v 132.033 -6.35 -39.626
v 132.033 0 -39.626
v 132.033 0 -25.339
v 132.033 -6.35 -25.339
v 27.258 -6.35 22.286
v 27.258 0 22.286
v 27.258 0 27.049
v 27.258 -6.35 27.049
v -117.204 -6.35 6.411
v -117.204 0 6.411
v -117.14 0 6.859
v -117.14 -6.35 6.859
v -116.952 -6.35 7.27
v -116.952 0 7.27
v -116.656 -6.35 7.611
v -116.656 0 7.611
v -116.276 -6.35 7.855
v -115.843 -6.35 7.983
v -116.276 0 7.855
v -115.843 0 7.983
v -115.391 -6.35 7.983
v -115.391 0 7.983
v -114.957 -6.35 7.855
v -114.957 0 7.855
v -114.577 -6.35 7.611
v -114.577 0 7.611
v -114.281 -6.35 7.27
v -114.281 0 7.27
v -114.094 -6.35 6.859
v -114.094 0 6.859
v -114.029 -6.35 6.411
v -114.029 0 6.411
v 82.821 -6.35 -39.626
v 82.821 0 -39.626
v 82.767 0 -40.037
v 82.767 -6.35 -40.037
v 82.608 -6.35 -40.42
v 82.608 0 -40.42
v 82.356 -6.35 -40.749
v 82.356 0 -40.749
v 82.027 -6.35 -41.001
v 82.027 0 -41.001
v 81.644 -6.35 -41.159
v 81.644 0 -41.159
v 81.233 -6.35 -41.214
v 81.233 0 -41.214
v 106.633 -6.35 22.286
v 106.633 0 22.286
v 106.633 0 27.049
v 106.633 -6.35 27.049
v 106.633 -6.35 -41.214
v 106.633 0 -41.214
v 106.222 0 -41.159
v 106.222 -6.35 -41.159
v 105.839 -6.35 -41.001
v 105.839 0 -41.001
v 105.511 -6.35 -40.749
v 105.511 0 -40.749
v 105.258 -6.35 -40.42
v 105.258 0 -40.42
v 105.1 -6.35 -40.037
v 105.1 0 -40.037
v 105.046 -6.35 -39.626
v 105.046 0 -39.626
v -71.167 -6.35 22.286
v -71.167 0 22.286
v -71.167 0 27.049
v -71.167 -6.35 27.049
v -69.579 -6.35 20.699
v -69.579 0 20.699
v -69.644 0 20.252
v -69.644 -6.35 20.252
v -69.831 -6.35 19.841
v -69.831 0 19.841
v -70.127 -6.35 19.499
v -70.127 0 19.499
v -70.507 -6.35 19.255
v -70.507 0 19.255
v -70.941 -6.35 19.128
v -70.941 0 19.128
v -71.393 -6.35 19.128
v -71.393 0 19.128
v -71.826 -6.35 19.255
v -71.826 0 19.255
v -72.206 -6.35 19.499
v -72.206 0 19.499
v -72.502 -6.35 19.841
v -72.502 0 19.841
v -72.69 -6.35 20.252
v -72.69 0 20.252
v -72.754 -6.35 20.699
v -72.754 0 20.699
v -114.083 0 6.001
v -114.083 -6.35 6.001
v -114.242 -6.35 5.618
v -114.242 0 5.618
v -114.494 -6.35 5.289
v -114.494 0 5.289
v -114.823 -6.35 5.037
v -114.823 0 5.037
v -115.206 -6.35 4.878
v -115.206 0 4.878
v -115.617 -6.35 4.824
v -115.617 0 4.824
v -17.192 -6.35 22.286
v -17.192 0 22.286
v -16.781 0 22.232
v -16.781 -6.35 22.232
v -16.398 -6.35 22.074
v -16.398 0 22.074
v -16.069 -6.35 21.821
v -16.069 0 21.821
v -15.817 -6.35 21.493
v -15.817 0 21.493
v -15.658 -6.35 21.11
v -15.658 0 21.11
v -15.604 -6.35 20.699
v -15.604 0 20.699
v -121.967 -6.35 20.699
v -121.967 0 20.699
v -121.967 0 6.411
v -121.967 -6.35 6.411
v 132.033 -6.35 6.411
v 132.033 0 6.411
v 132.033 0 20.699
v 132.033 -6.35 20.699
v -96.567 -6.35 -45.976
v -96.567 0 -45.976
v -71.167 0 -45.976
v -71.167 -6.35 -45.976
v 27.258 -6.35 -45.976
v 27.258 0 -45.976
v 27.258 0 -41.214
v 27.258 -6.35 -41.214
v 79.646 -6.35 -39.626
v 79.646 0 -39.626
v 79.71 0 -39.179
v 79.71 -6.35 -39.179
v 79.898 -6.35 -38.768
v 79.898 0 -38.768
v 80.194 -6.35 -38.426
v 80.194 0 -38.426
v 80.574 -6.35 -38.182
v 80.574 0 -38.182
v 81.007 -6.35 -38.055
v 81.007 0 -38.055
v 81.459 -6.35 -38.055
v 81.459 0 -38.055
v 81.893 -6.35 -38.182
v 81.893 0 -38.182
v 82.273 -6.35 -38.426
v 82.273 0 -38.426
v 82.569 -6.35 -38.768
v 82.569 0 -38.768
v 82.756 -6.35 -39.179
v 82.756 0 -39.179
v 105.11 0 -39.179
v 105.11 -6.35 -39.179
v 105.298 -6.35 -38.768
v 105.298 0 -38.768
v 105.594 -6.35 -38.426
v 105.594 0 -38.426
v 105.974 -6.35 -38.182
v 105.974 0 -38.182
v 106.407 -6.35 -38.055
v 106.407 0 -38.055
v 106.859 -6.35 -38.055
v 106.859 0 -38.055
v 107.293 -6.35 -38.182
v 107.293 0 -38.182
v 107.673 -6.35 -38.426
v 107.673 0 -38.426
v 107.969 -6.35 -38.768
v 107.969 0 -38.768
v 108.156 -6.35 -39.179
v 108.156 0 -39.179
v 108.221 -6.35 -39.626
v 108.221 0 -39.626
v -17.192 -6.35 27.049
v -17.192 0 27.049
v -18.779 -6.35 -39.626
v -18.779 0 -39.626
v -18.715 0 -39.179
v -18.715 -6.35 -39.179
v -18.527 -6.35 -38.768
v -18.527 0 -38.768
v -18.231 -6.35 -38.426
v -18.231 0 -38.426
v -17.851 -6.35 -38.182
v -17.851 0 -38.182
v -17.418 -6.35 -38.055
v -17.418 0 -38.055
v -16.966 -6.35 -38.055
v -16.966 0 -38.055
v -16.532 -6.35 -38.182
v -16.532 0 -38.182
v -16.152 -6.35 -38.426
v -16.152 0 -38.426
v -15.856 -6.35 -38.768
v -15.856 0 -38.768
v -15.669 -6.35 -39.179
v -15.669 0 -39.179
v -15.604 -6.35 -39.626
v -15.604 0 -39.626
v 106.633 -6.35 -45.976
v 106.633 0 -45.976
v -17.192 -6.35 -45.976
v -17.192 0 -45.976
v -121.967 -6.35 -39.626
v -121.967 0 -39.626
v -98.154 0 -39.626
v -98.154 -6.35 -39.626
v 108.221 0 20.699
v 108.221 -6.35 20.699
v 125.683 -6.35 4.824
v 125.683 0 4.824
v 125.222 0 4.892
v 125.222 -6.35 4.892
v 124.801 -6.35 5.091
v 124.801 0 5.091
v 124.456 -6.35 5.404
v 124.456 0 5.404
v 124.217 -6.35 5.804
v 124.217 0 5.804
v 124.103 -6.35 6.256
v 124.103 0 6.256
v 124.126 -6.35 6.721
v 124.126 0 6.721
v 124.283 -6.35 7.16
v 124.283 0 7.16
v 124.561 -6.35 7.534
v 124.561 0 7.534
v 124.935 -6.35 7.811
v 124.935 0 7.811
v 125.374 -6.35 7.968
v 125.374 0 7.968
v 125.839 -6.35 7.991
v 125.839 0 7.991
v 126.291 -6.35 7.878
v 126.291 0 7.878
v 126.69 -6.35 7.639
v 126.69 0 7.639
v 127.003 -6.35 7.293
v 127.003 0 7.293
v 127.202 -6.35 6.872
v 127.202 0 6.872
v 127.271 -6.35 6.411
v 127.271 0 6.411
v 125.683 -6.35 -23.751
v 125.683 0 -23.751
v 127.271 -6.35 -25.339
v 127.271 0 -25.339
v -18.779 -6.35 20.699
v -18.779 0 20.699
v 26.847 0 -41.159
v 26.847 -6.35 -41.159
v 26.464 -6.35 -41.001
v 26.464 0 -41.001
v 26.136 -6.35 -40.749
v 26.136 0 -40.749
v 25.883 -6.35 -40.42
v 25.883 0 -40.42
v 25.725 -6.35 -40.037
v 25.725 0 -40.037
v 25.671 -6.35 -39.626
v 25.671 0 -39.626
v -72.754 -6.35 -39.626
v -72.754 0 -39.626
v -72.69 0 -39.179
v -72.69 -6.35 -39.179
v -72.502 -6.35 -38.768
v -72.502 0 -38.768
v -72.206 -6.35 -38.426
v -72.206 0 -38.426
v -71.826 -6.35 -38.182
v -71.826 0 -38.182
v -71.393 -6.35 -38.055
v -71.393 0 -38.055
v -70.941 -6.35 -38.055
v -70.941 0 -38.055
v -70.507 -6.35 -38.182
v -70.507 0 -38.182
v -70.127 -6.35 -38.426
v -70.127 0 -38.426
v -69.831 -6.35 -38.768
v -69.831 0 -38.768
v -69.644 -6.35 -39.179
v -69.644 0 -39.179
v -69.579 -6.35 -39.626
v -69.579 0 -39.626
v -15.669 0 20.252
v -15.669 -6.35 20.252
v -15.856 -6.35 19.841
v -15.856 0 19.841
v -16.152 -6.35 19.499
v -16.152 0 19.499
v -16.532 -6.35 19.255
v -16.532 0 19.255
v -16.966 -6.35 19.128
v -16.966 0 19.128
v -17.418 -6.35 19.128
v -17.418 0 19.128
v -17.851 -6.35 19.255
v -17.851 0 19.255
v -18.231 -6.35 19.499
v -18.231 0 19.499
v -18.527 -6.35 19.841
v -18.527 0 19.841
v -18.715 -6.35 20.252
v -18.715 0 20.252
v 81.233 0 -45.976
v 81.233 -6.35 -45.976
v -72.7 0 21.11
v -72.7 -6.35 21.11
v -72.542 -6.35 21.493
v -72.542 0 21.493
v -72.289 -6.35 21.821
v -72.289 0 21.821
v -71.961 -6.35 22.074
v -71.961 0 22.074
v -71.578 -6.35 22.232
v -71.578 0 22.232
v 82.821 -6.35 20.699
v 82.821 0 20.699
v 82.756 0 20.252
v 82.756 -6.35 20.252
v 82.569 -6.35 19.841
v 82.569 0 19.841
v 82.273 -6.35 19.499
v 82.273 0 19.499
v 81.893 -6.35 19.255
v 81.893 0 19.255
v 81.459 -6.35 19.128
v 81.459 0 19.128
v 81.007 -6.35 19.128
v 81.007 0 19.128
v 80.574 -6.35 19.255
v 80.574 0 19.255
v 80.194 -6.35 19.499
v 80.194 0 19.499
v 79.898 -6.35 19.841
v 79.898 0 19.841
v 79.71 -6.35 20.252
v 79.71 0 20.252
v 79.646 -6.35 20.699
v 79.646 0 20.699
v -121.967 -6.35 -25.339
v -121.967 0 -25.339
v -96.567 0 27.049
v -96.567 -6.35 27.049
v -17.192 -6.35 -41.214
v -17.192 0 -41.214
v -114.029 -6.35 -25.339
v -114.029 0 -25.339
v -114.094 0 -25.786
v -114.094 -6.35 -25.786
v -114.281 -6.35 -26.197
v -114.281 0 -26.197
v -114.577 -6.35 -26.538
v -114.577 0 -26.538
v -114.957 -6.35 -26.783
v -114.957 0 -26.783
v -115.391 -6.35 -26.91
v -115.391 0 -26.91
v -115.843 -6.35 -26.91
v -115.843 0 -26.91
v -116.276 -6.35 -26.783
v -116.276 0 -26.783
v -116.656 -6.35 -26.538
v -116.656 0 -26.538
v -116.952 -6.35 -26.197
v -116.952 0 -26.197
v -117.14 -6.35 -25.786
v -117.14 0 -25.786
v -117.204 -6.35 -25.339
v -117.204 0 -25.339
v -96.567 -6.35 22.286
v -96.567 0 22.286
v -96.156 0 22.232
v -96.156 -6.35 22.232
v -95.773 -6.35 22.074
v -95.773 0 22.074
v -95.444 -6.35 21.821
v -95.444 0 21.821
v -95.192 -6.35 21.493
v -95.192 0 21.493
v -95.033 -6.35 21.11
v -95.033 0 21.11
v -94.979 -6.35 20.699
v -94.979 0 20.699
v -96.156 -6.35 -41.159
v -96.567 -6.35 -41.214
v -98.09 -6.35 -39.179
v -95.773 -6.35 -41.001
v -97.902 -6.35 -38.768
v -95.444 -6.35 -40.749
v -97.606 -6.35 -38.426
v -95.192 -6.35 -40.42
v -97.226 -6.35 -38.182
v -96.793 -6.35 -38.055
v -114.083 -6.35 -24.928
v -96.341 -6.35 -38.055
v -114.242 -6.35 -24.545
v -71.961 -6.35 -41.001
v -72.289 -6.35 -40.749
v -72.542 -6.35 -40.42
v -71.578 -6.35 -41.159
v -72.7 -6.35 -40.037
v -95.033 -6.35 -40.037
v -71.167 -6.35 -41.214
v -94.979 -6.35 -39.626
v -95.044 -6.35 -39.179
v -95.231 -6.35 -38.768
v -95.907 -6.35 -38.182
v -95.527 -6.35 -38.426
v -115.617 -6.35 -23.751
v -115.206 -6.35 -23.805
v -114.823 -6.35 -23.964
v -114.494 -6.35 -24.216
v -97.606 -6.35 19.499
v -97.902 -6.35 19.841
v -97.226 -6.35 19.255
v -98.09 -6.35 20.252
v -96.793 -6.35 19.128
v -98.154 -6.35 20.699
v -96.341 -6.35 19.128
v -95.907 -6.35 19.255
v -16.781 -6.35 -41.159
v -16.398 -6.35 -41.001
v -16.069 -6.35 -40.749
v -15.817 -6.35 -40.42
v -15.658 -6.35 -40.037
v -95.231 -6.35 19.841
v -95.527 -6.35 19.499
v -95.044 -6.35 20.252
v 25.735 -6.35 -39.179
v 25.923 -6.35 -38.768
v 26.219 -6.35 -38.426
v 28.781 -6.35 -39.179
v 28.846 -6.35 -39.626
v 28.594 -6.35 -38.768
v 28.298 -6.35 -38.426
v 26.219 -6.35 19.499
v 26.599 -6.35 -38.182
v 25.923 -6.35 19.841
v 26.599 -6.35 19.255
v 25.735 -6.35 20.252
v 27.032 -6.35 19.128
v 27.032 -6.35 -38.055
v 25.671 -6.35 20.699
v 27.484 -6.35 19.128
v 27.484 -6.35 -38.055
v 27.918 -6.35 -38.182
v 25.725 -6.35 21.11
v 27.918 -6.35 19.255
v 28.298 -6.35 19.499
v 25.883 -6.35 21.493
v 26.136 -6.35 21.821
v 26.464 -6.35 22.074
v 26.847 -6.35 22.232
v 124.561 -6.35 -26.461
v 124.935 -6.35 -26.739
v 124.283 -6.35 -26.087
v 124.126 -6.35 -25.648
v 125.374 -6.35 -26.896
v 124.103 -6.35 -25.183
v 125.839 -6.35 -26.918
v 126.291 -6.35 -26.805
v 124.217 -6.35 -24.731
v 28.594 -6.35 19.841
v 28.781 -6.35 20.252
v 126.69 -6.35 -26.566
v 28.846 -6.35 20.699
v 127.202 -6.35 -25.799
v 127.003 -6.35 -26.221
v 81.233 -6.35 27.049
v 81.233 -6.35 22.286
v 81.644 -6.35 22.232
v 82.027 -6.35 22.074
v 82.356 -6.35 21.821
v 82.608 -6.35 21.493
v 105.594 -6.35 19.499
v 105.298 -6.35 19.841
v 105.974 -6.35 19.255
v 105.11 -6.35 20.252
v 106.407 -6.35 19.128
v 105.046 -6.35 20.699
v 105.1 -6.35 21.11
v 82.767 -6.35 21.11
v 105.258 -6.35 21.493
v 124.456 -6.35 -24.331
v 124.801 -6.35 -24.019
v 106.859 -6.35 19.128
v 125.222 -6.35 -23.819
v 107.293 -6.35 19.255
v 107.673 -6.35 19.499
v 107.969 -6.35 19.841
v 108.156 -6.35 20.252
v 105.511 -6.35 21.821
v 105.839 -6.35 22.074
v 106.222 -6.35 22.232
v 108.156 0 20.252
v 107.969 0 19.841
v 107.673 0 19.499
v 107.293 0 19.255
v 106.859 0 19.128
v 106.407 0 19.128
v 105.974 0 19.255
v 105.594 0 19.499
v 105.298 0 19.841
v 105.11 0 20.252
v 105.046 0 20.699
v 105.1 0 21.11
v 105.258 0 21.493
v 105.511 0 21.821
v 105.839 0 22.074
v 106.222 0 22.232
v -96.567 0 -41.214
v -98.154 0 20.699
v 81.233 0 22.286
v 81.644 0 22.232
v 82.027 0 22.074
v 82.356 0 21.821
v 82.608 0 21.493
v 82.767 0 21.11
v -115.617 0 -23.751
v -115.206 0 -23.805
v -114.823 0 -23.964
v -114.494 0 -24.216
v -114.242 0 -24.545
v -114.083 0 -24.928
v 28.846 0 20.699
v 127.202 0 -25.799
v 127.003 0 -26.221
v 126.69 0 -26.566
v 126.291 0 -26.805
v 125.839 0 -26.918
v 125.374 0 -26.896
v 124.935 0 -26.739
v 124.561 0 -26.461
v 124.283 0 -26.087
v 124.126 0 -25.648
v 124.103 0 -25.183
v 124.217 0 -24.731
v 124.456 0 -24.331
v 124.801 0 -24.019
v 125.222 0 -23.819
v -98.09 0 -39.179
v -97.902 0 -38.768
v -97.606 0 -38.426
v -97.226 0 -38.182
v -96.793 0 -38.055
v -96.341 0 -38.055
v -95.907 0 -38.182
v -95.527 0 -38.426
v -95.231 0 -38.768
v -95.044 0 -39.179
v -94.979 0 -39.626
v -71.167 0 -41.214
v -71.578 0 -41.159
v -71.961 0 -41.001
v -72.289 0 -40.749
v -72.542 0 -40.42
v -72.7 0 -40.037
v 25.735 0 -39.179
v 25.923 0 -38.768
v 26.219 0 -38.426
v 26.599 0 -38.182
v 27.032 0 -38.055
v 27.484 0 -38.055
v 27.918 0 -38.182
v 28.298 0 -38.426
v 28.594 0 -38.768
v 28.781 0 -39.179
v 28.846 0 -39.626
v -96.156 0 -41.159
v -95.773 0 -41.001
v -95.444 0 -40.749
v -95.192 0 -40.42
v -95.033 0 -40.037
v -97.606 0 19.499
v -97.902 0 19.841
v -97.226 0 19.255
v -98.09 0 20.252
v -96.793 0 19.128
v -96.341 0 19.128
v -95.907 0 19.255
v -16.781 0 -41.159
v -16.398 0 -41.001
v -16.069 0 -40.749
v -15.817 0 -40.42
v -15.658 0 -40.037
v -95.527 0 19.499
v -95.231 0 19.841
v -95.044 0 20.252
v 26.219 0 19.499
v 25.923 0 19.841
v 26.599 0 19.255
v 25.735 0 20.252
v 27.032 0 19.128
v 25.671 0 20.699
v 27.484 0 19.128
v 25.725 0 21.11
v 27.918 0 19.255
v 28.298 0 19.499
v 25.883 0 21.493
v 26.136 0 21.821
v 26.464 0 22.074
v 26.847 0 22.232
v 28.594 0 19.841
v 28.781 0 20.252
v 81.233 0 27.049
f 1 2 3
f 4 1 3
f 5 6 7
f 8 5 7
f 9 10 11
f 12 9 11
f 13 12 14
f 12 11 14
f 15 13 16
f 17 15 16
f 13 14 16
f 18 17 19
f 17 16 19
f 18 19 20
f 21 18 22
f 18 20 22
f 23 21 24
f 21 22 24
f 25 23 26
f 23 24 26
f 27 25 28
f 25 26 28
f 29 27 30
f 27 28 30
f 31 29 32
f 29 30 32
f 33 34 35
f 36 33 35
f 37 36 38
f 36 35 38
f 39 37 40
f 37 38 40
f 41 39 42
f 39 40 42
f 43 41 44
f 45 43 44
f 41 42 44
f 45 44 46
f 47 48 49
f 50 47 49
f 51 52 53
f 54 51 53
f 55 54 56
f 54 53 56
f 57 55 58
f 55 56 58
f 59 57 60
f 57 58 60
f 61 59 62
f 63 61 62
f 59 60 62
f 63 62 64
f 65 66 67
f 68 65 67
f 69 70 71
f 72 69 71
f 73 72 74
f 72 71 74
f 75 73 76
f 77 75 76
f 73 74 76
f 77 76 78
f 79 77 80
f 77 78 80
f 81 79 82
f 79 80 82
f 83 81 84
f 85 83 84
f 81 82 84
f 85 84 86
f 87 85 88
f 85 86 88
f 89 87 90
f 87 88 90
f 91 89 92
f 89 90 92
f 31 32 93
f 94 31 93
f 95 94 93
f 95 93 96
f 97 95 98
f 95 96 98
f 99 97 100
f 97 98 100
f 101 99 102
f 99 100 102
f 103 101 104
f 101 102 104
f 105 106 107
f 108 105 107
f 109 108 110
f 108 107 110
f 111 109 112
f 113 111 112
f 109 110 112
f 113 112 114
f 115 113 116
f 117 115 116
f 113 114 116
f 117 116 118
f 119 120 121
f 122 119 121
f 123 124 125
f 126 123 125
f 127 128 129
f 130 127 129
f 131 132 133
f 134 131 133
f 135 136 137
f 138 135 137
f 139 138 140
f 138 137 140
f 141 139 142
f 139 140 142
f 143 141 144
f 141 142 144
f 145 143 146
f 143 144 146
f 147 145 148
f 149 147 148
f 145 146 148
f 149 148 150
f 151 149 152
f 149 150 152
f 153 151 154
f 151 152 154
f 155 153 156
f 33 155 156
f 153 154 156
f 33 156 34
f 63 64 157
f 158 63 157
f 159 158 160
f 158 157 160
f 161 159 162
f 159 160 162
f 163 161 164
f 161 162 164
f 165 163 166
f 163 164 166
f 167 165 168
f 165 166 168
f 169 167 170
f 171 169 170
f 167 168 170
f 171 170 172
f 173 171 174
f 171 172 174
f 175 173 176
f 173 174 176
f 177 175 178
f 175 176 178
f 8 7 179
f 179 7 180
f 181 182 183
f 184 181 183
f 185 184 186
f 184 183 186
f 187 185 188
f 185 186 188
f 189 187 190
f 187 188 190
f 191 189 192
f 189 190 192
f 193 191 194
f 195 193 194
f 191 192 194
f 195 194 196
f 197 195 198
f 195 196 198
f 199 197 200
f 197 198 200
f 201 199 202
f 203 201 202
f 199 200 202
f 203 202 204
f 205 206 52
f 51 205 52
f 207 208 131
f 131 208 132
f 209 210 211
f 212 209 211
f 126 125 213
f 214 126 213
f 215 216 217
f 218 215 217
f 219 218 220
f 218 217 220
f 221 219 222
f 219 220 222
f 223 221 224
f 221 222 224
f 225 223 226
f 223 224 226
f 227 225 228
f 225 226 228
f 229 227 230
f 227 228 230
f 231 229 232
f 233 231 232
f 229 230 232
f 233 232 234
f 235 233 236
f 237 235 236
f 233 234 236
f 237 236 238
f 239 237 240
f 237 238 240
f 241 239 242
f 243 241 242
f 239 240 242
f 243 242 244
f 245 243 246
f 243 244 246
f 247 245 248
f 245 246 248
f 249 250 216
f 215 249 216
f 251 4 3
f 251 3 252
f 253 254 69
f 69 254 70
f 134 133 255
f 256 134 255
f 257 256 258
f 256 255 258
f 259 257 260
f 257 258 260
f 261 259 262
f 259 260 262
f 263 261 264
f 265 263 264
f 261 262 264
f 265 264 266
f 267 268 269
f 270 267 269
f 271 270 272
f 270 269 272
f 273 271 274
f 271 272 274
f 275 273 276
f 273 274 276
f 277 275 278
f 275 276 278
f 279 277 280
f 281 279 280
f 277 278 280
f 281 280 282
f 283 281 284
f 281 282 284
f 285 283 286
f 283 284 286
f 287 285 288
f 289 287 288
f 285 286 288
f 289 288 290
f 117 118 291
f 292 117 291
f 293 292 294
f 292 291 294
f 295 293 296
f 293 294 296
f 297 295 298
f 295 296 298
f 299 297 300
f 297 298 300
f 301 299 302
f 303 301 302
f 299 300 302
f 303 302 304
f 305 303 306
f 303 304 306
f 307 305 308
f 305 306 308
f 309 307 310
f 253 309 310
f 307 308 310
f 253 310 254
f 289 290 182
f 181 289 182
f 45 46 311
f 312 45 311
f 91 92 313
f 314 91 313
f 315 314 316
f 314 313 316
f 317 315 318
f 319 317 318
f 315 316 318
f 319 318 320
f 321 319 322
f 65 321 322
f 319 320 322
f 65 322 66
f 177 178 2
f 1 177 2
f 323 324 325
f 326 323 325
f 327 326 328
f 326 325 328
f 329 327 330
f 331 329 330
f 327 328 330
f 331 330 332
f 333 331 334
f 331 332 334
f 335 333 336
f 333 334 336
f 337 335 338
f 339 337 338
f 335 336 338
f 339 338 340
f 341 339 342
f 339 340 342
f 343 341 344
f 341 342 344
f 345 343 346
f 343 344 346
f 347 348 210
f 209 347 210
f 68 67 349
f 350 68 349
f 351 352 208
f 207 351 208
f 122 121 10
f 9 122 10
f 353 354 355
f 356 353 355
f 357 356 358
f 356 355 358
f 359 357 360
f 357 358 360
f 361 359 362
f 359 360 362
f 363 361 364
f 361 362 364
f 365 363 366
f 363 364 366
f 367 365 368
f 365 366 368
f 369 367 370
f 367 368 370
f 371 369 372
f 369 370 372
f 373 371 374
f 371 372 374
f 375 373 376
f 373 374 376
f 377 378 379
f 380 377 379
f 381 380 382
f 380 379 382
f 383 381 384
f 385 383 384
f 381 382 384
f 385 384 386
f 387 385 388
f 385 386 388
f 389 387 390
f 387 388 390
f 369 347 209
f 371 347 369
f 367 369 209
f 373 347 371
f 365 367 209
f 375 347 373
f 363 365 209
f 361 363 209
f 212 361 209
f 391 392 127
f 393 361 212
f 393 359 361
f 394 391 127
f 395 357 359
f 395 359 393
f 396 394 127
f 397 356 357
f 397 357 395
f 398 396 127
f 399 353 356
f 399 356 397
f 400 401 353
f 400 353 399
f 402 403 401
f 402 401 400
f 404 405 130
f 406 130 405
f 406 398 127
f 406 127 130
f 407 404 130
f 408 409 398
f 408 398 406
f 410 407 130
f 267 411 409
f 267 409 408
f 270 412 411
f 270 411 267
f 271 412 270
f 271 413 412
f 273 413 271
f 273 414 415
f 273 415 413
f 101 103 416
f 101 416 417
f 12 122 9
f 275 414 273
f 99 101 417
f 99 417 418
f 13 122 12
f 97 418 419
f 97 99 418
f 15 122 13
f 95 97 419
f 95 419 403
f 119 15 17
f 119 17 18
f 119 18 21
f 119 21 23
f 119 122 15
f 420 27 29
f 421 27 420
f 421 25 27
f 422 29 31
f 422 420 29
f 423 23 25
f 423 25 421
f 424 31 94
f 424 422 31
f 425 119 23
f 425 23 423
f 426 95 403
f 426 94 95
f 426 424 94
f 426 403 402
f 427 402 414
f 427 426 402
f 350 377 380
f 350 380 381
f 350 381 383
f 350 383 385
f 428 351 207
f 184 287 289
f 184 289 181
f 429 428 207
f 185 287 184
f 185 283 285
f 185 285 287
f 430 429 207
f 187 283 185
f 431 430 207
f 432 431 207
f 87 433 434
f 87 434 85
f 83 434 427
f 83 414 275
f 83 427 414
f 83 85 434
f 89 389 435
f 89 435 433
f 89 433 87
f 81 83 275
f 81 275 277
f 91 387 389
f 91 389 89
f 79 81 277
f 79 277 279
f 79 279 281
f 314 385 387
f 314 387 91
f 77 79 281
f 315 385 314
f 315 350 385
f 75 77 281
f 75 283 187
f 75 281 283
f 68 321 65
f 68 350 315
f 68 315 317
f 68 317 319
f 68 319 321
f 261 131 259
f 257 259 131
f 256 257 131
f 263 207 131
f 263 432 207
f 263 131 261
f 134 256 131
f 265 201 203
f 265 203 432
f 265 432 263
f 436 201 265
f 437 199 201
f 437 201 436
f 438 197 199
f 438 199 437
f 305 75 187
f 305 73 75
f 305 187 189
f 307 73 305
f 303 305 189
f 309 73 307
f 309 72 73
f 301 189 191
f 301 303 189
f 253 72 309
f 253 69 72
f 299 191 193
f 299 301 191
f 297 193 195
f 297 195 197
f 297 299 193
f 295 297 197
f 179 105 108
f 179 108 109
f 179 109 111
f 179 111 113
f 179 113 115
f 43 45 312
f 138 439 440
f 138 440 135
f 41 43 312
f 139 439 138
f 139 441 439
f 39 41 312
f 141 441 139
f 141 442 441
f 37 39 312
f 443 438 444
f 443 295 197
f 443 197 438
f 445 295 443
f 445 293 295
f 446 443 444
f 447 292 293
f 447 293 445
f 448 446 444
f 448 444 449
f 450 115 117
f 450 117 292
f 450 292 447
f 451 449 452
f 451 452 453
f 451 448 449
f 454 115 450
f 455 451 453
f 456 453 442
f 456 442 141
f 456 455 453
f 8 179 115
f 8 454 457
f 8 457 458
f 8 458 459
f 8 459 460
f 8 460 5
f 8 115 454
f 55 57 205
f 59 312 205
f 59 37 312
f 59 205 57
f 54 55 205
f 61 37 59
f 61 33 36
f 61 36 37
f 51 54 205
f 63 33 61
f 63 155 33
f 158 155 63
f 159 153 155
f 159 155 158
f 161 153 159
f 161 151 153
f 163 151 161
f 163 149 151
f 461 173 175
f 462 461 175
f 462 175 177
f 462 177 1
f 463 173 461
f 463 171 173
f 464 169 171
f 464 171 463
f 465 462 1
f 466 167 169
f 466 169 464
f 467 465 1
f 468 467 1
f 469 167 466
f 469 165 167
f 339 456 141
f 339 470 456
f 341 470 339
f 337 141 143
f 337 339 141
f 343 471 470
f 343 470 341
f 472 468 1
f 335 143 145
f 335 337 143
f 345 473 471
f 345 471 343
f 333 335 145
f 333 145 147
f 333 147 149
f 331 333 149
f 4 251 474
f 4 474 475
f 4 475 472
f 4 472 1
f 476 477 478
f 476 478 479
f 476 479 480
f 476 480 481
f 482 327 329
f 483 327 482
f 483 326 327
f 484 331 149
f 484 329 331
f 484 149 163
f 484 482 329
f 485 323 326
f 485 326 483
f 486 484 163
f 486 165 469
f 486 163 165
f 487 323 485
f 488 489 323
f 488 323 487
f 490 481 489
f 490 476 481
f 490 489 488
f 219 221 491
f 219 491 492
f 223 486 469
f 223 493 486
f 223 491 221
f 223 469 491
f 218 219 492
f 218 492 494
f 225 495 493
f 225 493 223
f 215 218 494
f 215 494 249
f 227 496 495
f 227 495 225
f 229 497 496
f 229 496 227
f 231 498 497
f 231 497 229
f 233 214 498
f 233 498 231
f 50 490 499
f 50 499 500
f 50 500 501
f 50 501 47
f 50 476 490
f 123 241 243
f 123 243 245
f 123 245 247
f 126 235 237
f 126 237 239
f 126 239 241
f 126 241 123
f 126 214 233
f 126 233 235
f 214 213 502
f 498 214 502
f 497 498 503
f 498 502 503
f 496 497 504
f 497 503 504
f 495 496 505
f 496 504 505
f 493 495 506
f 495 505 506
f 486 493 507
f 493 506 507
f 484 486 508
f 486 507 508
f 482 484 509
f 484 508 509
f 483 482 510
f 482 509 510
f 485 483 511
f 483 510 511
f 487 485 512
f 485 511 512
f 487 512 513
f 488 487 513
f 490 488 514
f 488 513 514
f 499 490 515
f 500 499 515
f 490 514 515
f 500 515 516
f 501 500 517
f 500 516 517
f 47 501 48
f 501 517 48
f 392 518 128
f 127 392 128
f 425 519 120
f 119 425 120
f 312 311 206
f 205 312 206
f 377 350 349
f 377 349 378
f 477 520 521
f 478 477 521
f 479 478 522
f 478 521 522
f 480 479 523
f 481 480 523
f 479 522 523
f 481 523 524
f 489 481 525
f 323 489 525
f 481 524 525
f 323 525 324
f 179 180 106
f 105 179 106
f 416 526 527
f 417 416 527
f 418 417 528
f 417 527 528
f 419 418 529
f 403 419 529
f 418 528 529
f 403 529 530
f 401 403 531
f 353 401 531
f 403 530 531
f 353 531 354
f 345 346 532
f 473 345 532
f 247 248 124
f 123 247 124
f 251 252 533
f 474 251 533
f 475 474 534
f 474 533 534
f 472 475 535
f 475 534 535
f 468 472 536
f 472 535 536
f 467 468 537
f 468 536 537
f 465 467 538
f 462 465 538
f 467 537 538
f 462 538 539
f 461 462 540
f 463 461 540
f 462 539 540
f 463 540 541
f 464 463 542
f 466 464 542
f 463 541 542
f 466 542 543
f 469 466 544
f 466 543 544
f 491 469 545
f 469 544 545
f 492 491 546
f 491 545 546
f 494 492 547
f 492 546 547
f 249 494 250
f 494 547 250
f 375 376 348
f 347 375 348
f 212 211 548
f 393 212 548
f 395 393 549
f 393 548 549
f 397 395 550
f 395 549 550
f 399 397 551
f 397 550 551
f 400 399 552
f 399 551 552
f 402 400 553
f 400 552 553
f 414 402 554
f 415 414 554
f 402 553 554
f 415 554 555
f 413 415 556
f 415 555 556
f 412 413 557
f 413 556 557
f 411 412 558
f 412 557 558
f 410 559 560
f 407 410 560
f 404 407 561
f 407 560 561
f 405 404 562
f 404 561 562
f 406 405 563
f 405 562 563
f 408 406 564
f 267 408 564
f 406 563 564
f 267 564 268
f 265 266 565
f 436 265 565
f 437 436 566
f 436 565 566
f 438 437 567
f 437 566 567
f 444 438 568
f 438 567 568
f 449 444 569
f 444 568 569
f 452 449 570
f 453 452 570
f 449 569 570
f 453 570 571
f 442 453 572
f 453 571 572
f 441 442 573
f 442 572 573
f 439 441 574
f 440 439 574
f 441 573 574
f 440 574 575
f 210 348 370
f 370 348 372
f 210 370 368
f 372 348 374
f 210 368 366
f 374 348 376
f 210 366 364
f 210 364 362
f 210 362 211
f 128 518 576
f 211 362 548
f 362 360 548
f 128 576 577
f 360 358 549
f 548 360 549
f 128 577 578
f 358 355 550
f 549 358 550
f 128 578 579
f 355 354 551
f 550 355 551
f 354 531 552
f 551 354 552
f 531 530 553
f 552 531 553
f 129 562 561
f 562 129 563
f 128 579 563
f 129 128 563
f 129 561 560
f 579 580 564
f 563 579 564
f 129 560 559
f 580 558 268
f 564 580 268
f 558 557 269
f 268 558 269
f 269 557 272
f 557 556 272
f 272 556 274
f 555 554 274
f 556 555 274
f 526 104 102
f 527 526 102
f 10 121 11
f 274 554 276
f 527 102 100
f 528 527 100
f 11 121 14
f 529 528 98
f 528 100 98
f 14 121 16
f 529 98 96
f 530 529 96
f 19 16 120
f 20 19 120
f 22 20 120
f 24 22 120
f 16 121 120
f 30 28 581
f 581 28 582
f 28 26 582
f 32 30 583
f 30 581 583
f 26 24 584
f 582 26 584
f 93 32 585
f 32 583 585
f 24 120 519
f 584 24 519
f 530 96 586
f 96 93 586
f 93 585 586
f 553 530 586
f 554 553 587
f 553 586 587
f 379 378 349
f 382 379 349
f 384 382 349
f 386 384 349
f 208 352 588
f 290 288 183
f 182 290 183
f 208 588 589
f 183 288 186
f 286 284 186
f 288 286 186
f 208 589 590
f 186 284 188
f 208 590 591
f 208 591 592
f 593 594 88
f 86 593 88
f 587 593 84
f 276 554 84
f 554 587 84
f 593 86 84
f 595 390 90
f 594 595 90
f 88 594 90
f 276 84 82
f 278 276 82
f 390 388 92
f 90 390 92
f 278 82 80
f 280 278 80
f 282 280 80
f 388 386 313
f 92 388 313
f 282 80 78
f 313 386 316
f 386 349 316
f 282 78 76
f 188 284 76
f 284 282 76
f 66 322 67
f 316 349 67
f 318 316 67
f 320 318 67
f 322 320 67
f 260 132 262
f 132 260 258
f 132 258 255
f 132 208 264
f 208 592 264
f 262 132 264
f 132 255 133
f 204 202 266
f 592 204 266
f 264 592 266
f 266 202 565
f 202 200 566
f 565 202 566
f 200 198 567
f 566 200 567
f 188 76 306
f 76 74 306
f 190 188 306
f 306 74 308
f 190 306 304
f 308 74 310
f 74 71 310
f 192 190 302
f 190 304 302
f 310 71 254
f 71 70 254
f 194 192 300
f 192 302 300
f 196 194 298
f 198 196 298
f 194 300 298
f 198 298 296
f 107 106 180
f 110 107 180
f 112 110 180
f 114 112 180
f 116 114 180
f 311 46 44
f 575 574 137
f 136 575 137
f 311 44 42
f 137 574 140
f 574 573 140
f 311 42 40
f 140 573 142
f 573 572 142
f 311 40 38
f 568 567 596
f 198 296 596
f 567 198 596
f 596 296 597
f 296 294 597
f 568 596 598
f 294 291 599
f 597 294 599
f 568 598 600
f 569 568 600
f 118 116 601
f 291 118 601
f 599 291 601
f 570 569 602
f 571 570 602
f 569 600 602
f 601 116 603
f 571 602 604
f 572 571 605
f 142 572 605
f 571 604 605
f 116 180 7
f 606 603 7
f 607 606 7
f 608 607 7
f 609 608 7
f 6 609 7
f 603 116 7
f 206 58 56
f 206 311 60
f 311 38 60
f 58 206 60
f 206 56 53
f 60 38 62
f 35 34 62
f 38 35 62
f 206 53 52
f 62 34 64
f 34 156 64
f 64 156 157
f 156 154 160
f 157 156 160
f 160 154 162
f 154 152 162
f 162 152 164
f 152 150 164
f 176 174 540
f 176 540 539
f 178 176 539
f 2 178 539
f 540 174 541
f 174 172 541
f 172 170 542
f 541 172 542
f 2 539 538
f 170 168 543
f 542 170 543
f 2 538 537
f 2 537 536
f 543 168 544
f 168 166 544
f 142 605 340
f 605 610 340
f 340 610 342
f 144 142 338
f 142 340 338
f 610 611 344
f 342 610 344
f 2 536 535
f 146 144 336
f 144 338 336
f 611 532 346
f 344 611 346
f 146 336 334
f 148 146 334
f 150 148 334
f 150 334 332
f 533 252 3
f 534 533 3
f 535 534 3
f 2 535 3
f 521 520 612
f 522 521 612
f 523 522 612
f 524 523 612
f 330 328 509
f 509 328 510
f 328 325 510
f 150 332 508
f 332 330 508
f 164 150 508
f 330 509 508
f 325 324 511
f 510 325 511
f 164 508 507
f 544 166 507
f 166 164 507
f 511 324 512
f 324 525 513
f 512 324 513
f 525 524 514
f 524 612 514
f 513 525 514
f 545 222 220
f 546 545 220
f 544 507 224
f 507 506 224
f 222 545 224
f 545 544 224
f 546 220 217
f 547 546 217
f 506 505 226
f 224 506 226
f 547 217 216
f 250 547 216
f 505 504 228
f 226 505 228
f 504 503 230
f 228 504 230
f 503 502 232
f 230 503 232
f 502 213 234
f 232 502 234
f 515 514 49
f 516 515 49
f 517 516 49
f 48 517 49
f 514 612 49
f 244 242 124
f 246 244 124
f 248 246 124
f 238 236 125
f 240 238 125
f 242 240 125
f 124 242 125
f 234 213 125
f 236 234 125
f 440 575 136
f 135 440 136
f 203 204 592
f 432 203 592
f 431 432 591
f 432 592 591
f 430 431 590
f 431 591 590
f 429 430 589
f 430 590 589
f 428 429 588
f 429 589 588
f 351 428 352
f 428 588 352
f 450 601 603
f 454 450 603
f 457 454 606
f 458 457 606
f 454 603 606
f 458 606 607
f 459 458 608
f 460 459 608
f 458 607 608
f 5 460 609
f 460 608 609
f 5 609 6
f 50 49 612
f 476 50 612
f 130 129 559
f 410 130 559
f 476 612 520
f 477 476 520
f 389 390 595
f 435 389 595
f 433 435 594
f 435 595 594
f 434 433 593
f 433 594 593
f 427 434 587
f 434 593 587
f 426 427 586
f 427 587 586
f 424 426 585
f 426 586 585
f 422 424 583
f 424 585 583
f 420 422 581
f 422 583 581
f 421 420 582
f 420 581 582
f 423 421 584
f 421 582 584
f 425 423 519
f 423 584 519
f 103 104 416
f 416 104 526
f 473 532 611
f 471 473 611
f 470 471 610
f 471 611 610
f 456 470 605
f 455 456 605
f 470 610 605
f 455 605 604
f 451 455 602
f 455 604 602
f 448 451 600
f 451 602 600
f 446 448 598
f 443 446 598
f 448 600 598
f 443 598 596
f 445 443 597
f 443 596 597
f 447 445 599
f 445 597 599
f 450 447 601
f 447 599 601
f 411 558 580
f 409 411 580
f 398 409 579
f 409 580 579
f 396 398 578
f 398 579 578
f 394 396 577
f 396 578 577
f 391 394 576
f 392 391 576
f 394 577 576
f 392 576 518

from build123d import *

# Parameters (mm, degrees)
F1_DEPTH = 6.35


with BuildPart() as f1:
    # F0 (on Front) → F1 (new body)
    with BuildSketch(Plane.XZ):
        with BuildLine():
            ThreePointArc((-96.566791, 22.286435), (-95.444259, 21.821467), (-94.979291, 20.698935))
            Line((-94.979291, 20.698935), (-72.754291, 20.698935))
            ThreePointArc((-72.754291, 20.698935), (-72.289323, 21.821467), (-71.166791, 22.286435))
            Line((-71.166791, 22.286435), (-71.166791, 27.048935))
            Line((-71.166791, 27.048935), (-96.566791, 27.048935))
            Line((-96.566791, 27.048935), (-96.566791, 22.286435))
        make_face()
        with BuildLine():
            Line((-72.754291, 20.698935), (-94.979291, 20.698935))
            ThreePointArc((-94.979291, 20.698935), (-96.566791, 19.111435), (-98.154291, 20.698935))
            Line((-98.154291, 20.698935), (-121.966791, 20.698935))
            Line((-121.966791, 20.698935), (-121.966791, 6.411435))
            Line((-121.966791, 6.411435), (-117.204291, 6.411435))
            ThreePointArc((-117.204291, 6.411435), (-115.616791, 7.998935), (-114.029291, 6.411435))
            ThreePointArc((-114.029291, 6.411435), (-114.494259, 5.288903), (-115.616791, 4.823935))
            Line((-115.616791, 4.823935), (-115.616791, -23.751065))
            ThreePointArc((-115.616791, -23.751065), (-114.494259, -24.216033), (-114.029291, -25.338565))
            ThreePointArc((-114.029291, -25.338565), (-115.616791, -26.926065), (-117.204291, -25.338565))
            Line((-117.204291, -25.338565), (-121.966791, -25.338565))
            Line((-121.966791, -25.338565), (-121.966791, -39.626065))
            Line((-121.966791, -39.626065), (-98.154291, -39.626065))
            ThreePointArc((-98.154291, -39.626065), (-96.566791, -38.038565), (-94.979291, -39.626065))
            Line((-94.979291, -39.626065), (-72.754291, -39.626065))
            ThreePointArc((-72.754291, -39.626065), (-71.166791, -38.038565), (-69.579291, -39.626065))
            Line((-69.579291, -39.626065), (-18.779291, -39.626065))
            ThreePointArc((-18.779291, -39.626065), (-17.191791, -38.038565), (-15.604291, -39.626065))
            Line((-15.604291, -39.626065), (25.670709, -39.626065))
            ThreePointArc((25.670709, -39.626065), (27.258209, -38.038565), (28.845709, -39.626065))
            Line((28.845709, -39.626065), (79.645709, -39.626065))
            ThreePointArc((79.645709, -39.626065), (81.233209, -38.038565), (82.820709, -39.626065))
            Line((82.820709, -39.626065), (105.045709, -39.626065))
            ThreePointArc((105.045709, -39.626065), (106.633209, -38.038565), (108.220709, -39.626065))
            Line((108.220709, -39.626065), (132.033209, -39.626065))
            Line((132.033209, -39.626065), (132.033209, -25.338565))
            Line((132.033209, -25.338565), (127.270709, -25.338565))
            ThreePointArc((127.270709, -25.338565), (124.560677, -26.461097), (125.683209, -23.751065))
            Line((125.683209, -23.751065), (125.683209, 4.823935))
            ThreePointArc((125.683209, 4.823935), (124.560677, 7.533967), (127.270709, 6.411435))
            Line((127.270709, 6.411435), (132.033209, 6.411435))
            Line((132.033209, 6.411435), (132.033209, 20.698935))
            Line((132.033209, 20.698935), (108.220709, 20.698935))
            ThreePointArc((108.220709, 20.698935), (106.633209, 19.111435), (105.045709, 20.698935))
            Line((105.045709, 20.698935), (82.820709, 20.698935))
            ThreePointArc((82.820709, 20.698935), (81.233209, 19.111435), (79.645709, 20.698935))
            Line((79.645709, 20.698935), (28.845709, 20.698935))
            ThreePointArc((28.845709, 20.698935), (27.258209, 19.111435), (25.670709, 20.698935))
            Line((25.670709, 20.698935), (-15.604291, 20.698935))
            ThreePointArc((-15.604291, 20.698935), (-17.191791, 19.111435), (-18.779291, 20.698935))
            Line((-18.779291, 20.698935), (-69.579291, 20.698935))
            ThreePointArc((-69.579291, 20.698935), (-71.166791, 19.111435), (-72.754291, 20.698935))
        make_face()
        with BuildLine():
            Line((-17.191791, 27.048935), (-17.191791, 22.286435))
            ThreePointArc((-17.191791, 22.286435), (-16.069259, 21.821467), (-15.604291, 20.698935))
            Line((-15.604291, 20.698935), (25.670709, 20.698935))
            ThreePointArc((25.670709, 20.698935), (26.135677, 21.821467), (27.258209, 22.286435))
            Line((27.258209, 22.286435), (27.258209, 27.048935))
            Line((27.258209, 27.048935), (-17.191791, 27.048935))
        make_face()
        with BuildLine():
            Line((81.233209, 27.048935), (81.233209, 22.286435))
            ThreePointArc((81.233209, 22.286435), (82.355741, 21.821467), (82.820709, 20.698935))
            Line((82.820709, 20.698935), (105.045709, 20.698935))
            ThreePointArc((105.045709, 20.698935), (105.510677, 21.821467), (106.633209, 22.286435))
            Line((106.633209, 22.286435), (106.633209, 27.048935))
            Line((106.633209, 27.048935), (81.233209, 27.048935))
        make_face()
        with BuildLine():
            Line((105.045709, -39.626065), (82.820709, -39.626065))
            ThreePointArc((82.820709, -39.626065), (82.355741, -40.748597), (81.233209, -41.213565))
            Line((81.233209, -41.213565), (81.233209, -45.976065))
            Line((81.233209, -45.976065), (106.633209, -45.976065))
            Line((106.633209, -45.976065), (106.633209, -41.213565))
            ThreePointArc((106.633209, -41.213565), (105.510677, -40.748597), (105.045709, -39.626065))
        make_face()
        with BuildLine():
            Line((25.670709, -39.626065), (-15.604291, -39.626065))
            ThreePointArc((-15.604291, -39.626065), (-16.069259, -40.748597), (-17.191791, -41.213565))
            Line((-17.191791, -41.213565), (-17.191791, -45.976065))
            Line((-17.191791, -45.976065), (27.258209, -45.976065))
            Line((27.258209, -45.976065), (27.258209, -41.213565))
            ThreePointArc((27.258209, -41.213565), (26.135677, -40.748597), (25.670709, -39.626065))
        make_face()
        with BuildLine():
            Line((-72.754291, -39.626065), (-94.979291, -39.626065))
            ThreePointArc((-94.979291, -39.626065), (-95.444259, -40.748597), (-96.566791, -41.213565))
            Line((-96.566791, -41.213565), (-96.566791, -45.976065))
            Line((-96.566791, -45.976065), (-71.166791, -45.976065))
            Line((-71.166791, -45.976065), (-71.166791, -41.213565))
            ThreePointArc((-71.166791, -41.213565), (-72.289323, -40.748597), (-72.754291, -39.626065))
        make_face()
    extrude(amount=F1_DEPTH)


solid = f1.part
